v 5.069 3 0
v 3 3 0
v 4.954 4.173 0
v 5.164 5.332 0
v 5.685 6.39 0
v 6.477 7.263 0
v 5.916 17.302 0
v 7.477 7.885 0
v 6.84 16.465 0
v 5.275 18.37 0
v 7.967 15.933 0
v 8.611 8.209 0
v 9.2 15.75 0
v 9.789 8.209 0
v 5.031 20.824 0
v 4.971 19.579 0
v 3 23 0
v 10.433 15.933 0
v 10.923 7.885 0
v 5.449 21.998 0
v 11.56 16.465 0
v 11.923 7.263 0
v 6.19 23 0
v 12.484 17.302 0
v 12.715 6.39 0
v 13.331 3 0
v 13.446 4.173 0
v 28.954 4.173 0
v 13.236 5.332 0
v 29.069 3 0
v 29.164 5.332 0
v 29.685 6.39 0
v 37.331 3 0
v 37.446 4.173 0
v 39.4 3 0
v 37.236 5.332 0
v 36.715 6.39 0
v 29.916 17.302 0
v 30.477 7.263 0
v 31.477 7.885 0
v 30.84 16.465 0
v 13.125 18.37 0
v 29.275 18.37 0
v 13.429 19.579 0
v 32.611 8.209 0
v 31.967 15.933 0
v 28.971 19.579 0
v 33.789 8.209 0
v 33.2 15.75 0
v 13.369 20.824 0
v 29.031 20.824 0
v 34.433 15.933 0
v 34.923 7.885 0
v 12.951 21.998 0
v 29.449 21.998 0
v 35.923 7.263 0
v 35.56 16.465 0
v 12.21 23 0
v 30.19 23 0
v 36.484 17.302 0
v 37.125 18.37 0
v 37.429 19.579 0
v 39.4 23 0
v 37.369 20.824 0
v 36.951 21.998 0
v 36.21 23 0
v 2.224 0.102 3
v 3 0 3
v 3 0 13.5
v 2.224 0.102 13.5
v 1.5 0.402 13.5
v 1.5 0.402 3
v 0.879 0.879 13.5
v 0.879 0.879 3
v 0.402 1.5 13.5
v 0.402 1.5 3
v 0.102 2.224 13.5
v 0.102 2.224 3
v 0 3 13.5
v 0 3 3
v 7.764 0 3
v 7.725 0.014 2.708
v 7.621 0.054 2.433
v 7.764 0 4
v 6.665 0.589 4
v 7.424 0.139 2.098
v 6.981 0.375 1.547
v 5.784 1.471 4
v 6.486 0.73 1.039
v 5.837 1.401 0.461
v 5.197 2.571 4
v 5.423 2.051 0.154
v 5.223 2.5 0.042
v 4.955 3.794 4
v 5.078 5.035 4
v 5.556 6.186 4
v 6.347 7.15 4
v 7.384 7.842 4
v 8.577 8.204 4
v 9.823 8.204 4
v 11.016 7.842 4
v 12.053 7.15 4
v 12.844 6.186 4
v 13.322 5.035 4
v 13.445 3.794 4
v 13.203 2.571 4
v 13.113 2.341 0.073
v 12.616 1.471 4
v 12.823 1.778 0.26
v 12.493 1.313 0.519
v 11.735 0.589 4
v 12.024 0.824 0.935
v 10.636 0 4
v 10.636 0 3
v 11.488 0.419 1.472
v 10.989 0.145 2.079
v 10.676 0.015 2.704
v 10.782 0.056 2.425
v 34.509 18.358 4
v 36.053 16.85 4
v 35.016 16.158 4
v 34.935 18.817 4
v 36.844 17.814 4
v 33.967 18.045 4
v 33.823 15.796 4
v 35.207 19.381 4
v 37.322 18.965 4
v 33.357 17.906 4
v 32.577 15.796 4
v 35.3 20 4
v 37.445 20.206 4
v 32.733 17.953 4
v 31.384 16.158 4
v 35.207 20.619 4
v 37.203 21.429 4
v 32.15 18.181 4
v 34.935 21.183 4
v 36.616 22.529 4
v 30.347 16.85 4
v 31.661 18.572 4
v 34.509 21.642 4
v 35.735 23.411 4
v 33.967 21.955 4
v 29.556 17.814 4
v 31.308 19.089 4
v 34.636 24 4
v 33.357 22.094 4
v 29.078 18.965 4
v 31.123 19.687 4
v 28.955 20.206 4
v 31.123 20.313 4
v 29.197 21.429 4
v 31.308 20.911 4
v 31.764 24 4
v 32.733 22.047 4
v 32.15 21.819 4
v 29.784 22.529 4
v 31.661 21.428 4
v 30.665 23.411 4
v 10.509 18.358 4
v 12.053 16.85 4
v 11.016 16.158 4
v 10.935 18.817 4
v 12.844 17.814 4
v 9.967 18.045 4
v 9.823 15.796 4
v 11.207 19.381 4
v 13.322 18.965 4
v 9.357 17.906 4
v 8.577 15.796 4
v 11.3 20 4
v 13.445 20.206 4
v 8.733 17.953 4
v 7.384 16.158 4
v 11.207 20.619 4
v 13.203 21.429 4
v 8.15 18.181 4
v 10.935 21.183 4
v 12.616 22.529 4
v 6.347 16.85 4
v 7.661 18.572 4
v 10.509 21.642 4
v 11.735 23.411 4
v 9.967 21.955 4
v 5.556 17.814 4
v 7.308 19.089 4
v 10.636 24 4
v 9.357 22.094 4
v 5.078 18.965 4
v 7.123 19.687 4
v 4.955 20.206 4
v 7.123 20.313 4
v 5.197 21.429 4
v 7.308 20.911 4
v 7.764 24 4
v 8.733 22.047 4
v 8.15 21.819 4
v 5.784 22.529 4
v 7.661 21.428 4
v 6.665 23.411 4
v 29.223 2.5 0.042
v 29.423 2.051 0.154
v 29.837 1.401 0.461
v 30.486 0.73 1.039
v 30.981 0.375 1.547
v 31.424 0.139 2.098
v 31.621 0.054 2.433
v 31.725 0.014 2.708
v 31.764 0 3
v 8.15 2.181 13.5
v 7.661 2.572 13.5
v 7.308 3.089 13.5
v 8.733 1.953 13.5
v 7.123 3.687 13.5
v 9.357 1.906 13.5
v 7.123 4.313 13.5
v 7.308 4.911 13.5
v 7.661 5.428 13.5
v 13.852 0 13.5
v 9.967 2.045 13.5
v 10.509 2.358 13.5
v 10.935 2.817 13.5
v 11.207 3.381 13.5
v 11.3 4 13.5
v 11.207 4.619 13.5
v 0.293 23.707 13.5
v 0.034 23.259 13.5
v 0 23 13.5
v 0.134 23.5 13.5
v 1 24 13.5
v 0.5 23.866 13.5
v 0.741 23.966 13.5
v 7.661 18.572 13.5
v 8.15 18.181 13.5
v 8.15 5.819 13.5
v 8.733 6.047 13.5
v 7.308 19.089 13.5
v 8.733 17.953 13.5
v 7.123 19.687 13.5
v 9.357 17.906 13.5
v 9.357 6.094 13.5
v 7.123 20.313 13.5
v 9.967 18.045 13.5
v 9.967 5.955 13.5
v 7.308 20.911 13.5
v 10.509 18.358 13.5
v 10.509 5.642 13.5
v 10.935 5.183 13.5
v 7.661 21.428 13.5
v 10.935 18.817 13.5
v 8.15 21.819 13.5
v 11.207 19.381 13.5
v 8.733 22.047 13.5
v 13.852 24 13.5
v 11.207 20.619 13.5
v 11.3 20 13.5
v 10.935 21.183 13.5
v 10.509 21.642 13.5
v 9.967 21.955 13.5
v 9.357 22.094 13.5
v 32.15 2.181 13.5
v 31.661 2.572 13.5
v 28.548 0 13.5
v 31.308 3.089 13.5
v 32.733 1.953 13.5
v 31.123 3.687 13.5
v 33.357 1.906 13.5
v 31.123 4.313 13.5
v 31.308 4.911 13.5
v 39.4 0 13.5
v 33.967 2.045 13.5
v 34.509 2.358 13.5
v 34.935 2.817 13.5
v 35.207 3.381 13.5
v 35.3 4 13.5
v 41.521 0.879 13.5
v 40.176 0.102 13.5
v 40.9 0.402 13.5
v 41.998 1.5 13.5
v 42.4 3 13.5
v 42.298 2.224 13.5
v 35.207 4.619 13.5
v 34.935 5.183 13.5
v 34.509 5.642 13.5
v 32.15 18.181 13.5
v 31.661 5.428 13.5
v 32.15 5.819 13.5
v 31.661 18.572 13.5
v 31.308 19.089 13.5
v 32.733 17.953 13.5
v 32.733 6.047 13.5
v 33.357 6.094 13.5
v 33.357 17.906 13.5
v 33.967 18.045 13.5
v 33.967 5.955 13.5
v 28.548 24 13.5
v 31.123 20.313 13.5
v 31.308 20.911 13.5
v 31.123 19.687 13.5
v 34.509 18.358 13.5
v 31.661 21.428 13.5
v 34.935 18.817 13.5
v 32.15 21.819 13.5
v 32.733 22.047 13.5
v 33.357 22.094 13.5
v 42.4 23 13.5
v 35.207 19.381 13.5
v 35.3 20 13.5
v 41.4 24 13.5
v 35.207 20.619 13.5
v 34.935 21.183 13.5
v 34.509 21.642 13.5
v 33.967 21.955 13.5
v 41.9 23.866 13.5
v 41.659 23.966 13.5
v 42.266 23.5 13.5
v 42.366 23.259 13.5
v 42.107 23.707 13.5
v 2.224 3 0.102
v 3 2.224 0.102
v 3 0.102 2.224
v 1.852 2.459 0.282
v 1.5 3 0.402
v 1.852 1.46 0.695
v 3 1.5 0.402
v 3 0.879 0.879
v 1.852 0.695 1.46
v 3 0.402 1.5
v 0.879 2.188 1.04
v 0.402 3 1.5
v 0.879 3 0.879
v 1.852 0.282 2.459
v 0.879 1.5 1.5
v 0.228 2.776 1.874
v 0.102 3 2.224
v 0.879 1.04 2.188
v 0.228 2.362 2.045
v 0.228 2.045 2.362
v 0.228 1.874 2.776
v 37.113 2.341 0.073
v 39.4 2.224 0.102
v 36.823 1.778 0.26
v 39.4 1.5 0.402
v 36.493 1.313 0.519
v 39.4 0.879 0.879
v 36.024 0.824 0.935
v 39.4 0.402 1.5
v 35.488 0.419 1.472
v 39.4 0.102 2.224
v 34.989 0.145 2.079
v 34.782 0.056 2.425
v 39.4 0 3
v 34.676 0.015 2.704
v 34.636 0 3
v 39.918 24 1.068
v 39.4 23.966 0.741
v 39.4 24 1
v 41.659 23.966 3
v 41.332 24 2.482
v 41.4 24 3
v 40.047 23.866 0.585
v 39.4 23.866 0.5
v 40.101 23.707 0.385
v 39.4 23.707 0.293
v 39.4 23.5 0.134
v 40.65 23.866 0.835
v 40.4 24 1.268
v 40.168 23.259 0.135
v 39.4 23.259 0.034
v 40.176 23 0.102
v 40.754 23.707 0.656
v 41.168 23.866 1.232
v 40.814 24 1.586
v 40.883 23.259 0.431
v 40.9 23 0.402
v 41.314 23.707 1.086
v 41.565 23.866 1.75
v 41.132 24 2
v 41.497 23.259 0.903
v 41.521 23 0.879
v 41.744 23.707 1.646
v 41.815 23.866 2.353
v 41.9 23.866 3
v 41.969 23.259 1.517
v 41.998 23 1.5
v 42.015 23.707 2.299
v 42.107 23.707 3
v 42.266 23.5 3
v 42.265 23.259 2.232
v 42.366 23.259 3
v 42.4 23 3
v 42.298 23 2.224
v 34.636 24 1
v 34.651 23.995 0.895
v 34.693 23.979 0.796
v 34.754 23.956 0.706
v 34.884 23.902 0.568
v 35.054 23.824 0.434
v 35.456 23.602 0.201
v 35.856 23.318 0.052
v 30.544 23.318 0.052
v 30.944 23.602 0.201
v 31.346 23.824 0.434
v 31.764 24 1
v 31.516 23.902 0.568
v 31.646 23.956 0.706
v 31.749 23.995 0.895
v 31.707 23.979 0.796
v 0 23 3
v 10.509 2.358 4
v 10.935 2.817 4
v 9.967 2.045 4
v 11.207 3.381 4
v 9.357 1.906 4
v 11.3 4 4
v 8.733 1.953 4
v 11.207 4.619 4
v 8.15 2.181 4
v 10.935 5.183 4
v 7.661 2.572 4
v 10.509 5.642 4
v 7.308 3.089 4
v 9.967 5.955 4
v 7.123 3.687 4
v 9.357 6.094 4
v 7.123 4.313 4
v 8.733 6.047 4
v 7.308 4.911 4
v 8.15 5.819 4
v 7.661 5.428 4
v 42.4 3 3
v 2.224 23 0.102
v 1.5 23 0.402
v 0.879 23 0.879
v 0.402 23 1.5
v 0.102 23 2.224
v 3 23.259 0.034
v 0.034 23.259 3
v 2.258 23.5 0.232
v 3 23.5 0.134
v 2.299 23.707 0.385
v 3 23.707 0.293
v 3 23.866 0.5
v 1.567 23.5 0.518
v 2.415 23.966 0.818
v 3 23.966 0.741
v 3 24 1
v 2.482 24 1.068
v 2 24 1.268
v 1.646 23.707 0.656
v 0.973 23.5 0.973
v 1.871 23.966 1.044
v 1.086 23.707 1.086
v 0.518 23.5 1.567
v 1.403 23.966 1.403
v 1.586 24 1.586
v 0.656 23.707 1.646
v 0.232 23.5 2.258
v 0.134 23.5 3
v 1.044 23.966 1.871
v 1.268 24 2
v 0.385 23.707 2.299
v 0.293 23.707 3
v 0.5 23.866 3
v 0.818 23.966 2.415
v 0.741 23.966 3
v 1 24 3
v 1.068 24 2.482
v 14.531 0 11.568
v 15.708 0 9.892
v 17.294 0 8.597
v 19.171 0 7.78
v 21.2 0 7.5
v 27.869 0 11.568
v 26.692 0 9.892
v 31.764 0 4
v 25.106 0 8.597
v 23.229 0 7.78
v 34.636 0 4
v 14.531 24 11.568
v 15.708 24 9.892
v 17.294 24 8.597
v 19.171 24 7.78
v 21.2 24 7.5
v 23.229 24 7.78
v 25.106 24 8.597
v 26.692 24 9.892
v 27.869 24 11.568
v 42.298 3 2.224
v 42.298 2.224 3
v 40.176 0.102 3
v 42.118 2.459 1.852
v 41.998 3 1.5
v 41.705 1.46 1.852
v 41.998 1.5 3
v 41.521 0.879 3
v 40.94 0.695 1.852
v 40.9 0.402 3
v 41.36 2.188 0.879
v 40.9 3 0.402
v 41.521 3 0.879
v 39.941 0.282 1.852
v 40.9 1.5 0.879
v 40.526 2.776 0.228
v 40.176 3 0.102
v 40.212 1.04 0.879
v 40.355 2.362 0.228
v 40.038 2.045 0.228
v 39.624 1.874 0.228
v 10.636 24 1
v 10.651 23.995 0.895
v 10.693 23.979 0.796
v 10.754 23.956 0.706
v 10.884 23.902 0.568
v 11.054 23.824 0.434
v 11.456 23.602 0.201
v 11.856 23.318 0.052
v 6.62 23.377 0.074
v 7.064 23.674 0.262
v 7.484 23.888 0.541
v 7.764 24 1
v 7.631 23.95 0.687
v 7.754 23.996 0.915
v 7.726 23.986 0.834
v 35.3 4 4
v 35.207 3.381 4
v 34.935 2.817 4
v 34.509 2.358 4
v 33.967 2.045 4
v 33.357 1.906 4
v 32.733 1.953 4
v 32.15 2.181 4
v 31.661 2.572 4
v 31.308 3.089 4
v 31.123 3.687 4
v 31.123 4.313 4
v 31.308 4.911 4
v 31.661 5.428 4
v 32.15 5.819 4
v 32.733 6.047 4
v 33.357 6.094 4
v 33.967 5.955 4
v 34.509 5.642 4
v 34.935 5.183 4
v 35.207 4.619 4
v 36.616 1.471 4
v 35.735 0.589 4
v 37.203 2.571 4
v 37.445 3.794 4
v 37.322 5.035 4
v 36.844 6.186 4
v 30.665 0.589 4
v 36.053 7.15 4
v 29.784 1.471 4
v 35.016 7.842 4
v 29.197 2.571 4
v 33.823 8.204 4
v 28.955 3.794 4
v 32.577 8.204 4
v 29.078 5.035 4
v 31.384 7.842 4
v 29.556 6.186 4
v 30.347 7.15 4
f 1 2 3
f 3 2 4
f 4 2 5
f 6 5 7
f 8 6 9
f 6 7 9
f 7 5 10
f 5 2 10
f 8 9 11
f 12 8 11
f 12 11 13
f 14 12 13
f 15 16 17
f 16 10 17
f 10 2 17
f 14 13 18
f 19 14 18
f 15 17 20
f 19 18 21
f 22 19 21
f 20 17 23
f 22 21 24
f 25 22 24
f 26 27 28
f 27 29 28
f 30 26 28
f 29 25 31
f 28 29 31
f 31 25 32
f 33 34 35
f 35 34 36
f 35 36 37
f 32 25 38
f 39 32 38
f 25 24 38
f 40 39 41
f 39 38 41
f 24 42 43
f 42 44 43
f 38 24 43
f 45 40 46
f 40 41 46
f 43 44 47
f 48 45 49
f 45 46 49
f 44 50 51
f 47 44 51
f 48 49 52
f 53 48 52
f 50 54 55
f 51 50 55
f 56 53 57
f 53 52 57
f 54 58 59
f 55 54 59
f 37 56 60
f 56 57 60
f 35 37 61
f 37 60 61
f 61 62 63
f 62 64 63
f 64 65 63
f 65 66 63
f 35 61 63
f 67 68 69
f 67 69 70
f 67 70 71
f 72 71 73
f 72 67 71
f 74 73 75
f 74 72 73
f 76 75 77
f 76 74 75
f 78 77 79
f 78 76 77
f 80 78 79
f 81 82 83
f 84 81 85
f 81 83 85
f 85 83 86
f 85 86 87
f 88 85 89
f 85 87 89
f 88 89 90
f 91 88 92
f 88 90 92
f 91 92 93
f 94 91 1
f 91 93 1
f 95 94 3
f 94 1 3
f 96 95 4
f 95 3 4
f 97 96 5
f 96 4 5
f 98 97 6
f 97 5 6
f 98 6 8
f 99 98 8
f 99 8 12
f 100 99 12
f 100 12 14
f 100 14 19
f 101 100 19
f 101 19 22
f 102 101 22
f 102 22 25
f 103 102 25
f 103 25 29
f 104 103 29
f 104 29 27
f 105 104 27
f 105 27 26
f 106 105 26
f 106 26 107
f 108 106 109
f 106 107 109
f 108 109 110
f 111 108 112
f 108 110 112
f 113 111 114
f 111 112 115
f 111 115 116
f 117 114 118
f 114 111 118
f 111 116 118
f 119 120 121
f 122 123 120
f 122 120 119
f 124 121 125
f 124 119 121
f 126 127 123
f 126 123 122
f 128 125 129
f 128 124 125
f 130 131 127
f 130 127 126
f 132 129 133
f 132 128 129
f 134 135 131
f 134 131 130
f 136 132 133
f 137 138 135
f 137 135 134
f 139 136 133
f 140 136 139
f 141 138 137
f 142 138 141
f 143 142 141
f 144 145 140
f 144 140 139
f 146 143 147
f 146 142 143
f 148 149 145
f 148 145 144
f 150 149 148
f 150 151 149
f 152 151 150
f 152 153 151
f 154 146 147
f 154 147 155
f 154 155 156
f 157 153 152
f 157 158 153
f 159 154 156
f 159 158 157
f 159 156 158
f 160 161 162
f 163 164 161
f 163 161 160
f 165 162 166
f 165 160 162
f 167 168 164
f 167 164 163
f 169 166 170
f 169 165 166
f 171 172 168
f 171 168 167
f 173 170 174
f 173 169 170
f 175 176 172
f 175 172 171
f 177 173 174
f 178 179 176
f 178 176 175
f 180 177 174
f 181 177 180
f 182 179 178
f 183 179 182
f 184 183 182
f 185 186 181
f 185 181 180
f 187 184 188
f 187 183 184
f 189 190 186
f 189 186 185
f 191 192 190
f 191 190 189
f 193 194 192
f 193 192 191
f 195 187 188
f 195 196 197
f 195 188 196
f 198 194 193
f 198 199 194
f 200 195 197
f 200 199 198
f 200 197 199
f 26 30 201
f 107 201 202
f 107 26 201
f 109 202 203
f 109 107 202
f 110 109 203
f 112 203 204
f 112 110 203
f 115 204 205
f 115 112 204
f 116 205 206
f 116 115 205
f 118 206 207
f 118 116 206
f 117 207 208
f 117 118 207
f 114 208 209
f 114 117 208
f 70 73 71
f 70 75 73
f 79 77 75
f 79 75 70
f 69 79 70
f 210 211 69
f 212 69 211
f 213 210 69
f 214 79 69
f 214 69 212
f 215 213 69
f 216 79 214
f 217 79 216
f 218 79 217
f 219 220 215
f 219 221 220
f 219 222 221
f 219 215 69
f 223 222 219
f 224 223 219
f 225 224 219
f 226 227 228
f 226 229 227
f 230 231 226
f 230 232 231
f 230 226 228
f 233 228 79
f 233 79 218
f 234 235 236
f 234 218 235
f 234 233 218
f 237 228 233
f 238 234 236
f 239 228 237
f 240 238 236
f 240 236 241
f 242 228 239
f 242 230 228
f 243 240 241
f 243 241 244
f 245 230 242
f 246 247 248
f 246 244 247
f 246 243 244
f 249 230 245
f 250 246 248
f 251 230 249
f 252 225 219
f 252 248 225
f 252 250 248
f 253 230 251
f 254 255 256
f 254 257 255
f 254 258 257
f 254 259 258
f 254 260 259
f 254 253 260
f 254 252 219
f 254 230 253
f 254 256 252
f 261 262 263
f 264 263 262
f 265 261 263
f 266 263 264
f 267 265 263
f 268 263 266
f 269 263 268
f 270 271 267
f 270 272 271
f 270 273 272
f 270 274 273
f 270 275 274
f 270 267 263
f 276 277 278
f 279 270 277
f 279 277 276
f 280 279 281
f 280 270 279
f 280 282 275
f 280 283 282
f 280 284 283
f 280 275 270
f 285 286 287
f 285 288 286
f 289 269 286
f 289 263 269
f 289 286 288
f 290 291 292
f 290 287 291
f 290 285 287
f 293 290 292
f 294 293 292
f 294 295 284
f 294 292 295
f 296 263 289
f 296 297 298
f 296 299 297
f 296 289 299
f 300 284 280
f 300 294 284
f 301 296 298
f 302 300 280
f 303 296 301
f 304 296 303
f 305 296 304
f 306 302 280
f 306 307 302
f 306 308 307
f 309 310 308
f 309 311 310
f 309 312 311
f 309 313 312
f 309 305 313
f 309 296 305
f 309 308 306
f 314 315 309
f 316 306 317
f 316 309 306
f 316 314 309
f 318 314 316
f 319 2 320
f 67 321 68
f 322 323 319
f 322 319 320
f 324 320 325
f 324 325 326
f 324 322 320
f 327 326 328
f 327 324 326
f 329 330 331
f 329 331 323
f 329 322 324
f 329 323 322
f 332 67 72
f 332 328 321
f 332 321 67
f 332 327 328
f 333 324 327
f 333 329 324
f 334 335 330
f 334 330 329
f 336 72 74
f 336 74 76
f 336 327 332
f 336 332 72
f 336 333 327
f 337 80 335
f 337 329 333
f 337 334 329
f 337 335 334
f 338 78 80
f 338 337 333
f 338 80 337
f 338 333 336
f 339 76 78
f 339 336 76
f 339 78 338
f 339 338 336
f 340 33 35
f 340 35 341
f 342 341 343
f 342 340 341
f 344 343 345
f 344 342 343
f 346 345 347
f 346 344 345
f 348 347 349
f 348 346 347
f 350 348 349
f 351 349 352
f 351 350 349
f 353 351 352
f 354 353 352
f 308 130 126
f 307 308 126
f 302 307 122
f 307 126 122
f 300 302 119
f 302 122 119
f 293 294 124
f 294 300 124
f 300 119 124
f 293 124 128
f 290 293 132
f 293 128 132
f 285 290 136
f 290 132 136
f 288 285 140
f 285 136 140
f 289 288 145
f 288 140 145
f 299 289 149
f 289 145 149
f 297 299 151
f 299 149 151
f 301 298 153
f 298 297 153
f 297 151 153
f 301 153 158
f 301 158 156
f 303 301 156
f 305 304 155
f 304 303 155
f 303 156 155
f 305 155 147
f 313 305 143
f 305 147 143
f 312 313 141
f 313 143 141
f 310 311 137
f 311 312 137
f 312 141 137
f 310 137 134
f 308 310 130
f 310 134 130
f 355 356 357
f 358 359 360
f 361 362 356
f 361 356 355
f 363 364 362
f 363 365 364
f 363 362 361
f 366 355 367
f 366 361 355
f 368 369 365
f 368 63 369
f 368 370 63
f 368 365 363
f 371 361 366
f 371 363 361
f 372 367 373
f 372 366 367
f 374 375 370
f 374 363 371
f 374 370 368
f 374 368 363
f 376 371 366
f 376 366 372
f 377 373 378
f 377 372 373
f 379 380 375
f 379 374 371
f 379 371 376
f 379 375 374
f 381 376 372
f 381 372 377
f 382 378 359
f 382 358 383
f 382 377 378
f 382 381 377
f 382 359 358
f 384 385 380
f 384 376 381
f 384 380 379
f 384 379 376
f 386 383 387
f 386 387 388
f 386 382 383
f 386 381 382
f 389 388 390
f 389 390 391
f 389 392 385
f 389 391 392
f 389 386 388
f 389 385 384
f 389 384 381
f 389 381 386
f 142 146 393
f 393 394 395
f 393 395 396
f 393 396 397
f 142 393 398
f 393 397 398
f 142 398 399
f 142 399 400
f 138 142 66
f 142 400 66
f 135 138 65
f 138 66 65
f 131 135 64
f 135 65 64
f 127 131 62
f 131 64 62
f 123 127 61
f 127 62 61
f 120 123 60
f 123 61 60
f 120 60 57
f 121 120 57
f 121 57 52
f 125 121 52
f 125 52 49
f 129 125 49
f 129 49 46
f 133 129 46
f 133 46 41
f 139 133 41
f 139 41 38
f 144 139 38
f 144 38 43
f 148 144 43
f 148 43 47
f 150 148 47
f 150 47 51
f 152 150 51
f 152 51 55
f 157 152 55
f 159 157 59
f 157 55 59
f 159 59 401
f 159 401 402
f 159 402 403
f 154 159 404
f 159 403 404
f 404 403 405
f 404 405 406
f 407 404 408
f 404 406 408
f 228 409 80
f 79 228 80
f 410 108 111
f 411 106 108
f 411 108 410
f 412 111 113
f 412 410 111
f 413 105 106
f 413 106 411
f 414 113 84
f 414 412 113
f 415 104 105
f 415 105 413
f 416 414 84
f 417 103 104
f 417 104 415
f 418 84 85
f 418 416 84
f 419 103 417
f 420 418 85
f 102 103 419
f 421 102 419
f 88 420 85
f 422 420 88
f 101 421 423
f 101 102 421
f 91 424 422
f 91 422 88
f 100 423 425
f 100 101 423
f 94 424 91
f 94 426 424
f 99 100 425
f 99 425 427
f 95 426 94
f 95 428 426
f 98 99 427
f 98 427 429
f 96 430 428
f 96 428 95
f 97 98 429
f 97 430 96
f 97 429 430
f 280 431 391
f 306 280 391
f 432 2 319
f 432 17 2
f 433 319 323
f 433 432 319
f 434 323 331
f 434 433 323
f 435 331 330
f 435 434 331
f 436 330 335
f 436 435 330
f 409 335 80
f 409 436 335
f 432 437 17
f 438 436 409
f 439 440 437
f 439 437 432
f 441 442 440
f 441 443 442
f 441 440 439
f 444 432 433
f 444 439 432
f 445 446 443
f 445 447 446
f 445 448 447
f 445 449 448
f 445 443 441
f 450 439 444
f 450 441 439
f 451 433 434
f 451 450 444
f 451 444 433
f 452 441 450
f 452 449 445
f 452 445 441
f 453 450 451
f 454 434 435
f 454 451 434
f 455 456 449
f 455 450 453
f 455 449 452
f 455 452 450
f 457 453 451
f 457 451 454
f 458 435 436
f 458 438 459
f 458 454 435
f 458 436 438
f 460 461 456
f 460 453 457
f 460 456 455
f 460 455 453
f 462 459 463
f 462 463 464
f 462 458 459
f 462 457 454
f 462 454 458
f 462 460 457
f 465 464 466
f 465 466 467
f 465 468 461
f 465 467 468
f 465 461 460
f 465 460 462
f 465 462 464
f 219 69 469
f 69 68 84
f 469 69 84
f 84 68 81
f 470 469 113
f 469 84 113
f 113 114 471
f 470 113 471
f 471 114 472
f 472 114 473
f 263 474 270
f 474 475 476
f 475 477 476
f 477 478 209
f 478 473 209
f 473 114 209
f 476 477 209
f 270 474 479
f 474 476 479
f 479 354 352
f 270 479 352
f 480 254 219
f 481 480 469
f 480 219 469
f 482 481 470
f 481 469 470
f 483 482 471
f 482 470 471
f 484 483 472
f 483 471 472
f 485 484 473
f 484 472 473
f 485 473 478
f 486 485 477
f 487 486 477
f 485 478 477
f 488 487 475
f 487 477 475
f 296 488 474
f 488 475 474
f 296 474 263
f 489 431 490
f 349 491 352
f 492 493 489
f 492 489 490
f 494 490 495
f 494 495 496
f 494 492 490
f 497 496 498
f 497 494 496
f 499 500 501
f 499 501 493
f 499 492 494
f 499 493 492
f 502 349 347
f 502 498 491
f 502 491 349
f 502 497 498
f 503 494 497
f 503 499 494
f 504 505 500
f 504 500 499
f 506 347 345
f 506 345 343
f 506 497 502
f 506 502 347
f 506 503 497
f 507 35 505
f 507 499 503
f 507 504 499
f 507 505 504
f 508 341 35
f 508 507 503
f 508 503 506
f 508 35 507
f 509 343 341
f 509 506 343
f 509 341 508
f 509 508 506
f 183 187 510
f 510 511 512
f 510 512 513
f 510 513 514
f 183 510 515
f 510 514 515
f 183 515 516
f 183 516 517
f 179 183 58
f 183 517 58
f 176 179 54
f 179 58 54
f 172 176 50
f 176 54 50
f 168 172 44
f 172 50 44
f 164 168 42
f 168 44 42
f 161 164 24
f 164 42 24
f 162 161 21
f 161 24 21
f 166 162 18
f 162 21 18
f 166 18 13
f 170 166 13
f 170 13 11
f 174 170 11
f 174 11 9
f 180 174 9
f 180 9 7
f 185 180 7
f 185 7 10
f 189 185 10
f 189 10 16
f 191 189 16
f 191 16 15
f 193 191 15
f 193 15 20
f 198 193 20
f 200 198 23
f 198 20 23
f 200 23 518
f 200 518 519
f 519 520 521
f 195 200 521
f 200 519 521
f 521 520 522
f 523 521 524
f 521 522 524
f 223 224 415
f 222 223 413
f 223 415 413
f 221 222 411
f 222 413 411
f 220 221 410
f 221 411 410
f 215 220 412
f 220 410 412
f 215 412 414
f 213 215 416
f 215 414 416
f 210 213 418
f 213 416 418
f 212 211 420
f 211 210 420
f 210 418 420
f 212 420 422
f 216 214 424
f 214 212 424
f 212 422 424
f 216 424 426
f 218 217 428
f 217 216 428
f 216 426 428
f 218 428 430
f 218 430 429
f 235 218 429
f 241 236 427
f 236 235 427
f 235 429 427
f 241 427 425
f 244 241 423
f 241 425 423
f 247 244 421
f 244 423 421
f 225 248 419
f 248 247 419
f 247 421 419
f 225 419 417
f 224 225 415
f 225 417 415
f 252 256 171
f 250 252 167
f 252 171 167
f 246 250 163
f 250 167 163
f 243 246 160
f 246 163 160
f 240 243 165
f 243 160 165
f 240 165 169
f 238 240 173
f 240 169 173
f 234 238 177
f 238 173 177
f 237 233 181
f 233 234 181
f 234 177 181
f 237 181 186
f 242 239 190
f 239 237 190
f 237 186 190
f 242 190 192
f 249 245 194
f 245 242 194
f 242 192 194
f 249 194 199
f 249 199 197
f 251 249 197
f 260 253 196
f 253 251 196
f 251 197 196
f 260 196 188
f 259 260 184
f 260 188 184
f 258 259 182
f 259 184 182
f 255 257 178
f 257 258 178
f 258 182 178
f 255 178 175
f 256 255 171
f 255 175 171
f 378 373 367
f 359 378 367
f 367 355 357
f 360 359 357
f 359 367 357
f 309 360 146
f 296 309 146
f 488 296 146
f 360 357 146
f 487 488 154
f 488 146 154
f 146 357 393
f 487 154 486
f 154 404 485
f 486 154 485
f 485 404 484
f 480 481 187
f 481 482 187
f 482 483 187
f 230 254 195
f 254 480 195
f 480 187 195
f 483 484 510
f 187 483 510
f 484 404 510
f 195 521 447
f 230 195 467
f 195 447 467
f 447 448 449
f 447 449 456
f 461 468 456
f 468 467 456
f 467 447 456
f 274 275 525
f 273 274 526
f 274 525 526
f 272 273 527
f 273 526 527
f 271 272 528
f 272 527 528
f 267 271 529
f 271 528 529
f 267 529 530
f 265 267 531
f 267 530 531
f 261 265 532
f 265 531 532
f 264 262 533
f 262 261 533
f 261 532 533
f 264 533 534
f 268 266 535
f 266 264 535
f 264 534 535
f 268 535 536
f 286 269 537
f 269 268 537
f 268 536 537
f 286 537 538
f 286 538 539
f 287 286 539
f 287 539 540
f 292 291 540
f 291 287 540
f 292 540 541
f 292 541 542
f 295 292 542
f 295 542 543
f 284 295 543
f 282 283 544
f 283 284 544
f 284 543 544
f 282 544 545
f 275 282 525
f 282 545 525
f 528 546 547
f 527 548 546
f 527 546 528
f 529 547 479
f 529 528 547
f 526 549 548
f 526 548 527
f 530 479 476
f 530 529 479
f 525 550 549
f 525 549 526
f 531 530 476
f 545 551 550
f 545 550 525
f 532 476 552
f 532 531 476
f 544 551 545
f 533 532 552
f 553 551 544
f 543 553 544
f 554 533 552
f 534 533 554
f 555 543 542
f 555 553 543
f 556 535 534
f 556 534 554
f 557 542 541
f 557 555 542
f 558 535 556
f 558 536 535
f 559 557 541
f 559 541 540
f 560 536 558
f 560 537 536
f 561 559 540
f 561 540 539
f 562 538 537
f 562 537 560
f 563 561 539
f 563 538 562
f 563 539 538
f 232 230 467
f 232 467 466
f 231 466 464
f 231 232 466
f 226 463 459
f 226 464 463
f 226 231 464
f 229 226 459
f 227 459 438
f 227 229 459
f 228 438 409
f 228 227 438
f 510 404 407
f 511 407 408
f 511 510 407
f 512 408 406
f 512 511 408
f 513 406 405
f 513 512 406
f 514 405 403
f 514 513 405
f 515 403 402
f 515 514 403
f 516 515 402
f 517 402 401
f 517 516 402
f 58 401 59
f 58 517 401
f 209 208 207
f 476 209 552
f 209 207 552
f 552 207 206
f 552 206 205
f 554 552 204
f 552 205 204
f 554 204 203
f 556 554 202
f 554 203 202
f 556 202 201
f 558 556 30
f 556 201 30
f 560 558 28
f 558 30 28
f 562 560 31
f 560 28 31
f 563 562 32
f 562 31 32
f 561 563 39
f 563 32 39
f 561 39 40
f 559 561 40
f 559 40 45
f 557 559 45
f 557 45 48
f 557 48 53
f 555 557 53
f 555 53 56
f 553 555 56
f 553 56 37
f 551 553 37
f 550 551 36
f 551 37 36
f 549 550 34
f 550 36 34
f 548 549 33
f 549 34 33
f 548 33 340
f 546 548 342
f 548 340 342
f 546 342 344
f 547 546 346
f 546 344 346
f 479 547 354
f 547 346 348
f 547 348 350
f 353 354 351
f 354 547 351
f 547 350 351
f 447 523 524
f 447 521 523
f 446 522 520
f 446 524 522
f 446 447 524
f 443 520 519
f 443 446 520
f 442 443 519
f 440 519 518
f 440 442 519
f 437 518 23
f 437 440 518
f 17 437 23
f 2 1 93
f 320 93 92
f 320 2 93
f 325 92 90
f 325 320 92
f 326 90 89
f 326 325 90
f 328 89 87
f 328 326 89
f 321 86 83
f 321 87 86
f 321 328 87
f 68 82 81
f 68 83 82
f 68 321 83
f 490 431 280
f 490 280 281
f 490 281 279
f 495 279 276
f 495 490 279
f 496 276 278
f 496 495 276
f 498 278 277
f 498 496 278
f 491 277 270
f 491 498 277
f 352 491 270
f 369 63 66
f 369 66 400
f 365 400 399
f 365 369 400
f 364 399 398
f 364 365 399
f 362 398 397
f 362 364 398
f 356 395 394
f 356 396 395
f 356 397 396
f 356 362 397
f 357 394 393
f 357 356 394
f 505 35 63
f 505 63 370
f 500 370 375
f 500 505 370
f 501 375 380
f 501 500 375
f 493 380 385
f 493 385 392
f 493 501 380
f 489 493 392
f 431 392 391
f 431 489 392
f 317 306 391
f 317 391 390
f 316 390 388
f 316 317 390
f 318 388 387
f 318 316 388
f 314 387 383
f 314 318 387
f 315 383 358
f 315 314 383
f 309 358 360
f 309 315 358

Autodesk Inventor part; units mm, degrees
ref_plane "YZ Plane" through (0, 0, 0) normal (1, 0, 0) x (0, 1, 0)
ref_plane "XZ Plane" through (0, 0, 0) normal (0, 1, 0) x (-1, 0, 0)
ref_plane "XY Plane" through (0, 0, 0) normal (0, 0, 1) x (1, 0, 0)
sketch "Sketch1" plane through (0, 0, 0) normal (0, 0, 1) x (1, 0, 0)
  line L0 (0, 0) -> (42.4, 0)
  line L1 (42.4, 0) -> (42.4, 24)
  line L2 (42.4, 24) -> (0, 24)
  line L3 (0, 24) -> (0, 0)
  circle A0 centre (9.2, 20) radius 2.1
  circle A1 centre (33.2, 20) radius 2.1
  circle A2 centre (33.2, 4) radius 2.1
  circle A3 centre (9.2, 4) radius 2.1
  dimension "d0" = 24
  dimension "d1" = 42.4
  dimension "d2" = 4.2
  dimension "d3" = 9.2
  dimension "d4" = 9.2
  dimension "d5" = 9.2
  dimension "d6" = 9.2
  dimension "d7" = 4
  dimension "d8" = 4
  dimension "d9" = 4
  dimension "d10" = 4
extrude "Extrusion1" add sketch "Sketch1" along normal blind 13.5
sketch "Sketch2" plane through (0, 0, 0) normal (0, -1, 0) x (1, 0, 0)
  line L0 (42.4, 13.5) -> (0, 13.5) projected
  line L1 (0, 0) -> (0, 13.5) projected
  circle A0 centre (21.2, 15) radius 7.5
  dimension "d13" = 15
  dimension "d14" = 21.2
  dimension "d15" = 1.5
extrude "Extrusion2" cut sketch "Sketch2" against normal through all
fillet "Fillet1" radius 3 3 edges at (42.4, 0, 6.75) (0, 0, 6.75) (21.2, 0, 0)
sketch "Sketch3" plane through (0, 0, 0) normal (0, 0, -1) x (-1, 0, 0)
  arc A0 (-31.3534, 3) -> (-35.0466, 3) centre (-33.2, 4) ccw projected
  arc A1 (-7.3534, 3) -> (-11.0466, 3) centre (-9.2, 4) ccw projected
  circle A2 centre (-33.2, 20) radius 2.1 projected
  circle A3 centre (-9.2, 20) radius 2.1 projected
  circle A4 centre (-33.2, 20) radius 4.25
  circle A5 centre (-9.2, 20) radius 4.25
  circle A6 centre (-9.2, 4) radius 4.25
  circle A7 centre (-33.2, 4) radius 4.25
  point P0 (0, 0)
  dimension "d20" = 8.5
extrude "Extrusion3" cut sketch "Sketch3" against normal blind 4
sketch "Sketch4" plane through (21.2, 0, 15) normal (0, -1, 0) x (1, 0, 0)
  line L0 (-26.3081, 1.9971) -> (24.247, 1.9971)
  line L1 (24.247, 1.9971) -> (24.247, -18.7305)
  line L2 (24.247, -18.7305) -> (-26.3081, -18.7305)
  line L3 (-26.3081, -18.7305) -> (-26.3081, 1.9971)
  point P0 (-21.2, -15)
extrude "Extrusion4" [suppressed]
fillet "Fillet3" radius 3 2 edges at (42.4, 13.5, 0) (0, 13.5, 0)
fillet "Fillet4" radius 1 7 edges at (41.5213, 24, 0.8787) (37.0181, 24, 0) (42.4, 24, 8.25) (21.2, 24, 0) (0.8787, 24, 0.8787) (0, 24, 8.25) (5.3819, 24, 0)
properties part number "Z move plate"
